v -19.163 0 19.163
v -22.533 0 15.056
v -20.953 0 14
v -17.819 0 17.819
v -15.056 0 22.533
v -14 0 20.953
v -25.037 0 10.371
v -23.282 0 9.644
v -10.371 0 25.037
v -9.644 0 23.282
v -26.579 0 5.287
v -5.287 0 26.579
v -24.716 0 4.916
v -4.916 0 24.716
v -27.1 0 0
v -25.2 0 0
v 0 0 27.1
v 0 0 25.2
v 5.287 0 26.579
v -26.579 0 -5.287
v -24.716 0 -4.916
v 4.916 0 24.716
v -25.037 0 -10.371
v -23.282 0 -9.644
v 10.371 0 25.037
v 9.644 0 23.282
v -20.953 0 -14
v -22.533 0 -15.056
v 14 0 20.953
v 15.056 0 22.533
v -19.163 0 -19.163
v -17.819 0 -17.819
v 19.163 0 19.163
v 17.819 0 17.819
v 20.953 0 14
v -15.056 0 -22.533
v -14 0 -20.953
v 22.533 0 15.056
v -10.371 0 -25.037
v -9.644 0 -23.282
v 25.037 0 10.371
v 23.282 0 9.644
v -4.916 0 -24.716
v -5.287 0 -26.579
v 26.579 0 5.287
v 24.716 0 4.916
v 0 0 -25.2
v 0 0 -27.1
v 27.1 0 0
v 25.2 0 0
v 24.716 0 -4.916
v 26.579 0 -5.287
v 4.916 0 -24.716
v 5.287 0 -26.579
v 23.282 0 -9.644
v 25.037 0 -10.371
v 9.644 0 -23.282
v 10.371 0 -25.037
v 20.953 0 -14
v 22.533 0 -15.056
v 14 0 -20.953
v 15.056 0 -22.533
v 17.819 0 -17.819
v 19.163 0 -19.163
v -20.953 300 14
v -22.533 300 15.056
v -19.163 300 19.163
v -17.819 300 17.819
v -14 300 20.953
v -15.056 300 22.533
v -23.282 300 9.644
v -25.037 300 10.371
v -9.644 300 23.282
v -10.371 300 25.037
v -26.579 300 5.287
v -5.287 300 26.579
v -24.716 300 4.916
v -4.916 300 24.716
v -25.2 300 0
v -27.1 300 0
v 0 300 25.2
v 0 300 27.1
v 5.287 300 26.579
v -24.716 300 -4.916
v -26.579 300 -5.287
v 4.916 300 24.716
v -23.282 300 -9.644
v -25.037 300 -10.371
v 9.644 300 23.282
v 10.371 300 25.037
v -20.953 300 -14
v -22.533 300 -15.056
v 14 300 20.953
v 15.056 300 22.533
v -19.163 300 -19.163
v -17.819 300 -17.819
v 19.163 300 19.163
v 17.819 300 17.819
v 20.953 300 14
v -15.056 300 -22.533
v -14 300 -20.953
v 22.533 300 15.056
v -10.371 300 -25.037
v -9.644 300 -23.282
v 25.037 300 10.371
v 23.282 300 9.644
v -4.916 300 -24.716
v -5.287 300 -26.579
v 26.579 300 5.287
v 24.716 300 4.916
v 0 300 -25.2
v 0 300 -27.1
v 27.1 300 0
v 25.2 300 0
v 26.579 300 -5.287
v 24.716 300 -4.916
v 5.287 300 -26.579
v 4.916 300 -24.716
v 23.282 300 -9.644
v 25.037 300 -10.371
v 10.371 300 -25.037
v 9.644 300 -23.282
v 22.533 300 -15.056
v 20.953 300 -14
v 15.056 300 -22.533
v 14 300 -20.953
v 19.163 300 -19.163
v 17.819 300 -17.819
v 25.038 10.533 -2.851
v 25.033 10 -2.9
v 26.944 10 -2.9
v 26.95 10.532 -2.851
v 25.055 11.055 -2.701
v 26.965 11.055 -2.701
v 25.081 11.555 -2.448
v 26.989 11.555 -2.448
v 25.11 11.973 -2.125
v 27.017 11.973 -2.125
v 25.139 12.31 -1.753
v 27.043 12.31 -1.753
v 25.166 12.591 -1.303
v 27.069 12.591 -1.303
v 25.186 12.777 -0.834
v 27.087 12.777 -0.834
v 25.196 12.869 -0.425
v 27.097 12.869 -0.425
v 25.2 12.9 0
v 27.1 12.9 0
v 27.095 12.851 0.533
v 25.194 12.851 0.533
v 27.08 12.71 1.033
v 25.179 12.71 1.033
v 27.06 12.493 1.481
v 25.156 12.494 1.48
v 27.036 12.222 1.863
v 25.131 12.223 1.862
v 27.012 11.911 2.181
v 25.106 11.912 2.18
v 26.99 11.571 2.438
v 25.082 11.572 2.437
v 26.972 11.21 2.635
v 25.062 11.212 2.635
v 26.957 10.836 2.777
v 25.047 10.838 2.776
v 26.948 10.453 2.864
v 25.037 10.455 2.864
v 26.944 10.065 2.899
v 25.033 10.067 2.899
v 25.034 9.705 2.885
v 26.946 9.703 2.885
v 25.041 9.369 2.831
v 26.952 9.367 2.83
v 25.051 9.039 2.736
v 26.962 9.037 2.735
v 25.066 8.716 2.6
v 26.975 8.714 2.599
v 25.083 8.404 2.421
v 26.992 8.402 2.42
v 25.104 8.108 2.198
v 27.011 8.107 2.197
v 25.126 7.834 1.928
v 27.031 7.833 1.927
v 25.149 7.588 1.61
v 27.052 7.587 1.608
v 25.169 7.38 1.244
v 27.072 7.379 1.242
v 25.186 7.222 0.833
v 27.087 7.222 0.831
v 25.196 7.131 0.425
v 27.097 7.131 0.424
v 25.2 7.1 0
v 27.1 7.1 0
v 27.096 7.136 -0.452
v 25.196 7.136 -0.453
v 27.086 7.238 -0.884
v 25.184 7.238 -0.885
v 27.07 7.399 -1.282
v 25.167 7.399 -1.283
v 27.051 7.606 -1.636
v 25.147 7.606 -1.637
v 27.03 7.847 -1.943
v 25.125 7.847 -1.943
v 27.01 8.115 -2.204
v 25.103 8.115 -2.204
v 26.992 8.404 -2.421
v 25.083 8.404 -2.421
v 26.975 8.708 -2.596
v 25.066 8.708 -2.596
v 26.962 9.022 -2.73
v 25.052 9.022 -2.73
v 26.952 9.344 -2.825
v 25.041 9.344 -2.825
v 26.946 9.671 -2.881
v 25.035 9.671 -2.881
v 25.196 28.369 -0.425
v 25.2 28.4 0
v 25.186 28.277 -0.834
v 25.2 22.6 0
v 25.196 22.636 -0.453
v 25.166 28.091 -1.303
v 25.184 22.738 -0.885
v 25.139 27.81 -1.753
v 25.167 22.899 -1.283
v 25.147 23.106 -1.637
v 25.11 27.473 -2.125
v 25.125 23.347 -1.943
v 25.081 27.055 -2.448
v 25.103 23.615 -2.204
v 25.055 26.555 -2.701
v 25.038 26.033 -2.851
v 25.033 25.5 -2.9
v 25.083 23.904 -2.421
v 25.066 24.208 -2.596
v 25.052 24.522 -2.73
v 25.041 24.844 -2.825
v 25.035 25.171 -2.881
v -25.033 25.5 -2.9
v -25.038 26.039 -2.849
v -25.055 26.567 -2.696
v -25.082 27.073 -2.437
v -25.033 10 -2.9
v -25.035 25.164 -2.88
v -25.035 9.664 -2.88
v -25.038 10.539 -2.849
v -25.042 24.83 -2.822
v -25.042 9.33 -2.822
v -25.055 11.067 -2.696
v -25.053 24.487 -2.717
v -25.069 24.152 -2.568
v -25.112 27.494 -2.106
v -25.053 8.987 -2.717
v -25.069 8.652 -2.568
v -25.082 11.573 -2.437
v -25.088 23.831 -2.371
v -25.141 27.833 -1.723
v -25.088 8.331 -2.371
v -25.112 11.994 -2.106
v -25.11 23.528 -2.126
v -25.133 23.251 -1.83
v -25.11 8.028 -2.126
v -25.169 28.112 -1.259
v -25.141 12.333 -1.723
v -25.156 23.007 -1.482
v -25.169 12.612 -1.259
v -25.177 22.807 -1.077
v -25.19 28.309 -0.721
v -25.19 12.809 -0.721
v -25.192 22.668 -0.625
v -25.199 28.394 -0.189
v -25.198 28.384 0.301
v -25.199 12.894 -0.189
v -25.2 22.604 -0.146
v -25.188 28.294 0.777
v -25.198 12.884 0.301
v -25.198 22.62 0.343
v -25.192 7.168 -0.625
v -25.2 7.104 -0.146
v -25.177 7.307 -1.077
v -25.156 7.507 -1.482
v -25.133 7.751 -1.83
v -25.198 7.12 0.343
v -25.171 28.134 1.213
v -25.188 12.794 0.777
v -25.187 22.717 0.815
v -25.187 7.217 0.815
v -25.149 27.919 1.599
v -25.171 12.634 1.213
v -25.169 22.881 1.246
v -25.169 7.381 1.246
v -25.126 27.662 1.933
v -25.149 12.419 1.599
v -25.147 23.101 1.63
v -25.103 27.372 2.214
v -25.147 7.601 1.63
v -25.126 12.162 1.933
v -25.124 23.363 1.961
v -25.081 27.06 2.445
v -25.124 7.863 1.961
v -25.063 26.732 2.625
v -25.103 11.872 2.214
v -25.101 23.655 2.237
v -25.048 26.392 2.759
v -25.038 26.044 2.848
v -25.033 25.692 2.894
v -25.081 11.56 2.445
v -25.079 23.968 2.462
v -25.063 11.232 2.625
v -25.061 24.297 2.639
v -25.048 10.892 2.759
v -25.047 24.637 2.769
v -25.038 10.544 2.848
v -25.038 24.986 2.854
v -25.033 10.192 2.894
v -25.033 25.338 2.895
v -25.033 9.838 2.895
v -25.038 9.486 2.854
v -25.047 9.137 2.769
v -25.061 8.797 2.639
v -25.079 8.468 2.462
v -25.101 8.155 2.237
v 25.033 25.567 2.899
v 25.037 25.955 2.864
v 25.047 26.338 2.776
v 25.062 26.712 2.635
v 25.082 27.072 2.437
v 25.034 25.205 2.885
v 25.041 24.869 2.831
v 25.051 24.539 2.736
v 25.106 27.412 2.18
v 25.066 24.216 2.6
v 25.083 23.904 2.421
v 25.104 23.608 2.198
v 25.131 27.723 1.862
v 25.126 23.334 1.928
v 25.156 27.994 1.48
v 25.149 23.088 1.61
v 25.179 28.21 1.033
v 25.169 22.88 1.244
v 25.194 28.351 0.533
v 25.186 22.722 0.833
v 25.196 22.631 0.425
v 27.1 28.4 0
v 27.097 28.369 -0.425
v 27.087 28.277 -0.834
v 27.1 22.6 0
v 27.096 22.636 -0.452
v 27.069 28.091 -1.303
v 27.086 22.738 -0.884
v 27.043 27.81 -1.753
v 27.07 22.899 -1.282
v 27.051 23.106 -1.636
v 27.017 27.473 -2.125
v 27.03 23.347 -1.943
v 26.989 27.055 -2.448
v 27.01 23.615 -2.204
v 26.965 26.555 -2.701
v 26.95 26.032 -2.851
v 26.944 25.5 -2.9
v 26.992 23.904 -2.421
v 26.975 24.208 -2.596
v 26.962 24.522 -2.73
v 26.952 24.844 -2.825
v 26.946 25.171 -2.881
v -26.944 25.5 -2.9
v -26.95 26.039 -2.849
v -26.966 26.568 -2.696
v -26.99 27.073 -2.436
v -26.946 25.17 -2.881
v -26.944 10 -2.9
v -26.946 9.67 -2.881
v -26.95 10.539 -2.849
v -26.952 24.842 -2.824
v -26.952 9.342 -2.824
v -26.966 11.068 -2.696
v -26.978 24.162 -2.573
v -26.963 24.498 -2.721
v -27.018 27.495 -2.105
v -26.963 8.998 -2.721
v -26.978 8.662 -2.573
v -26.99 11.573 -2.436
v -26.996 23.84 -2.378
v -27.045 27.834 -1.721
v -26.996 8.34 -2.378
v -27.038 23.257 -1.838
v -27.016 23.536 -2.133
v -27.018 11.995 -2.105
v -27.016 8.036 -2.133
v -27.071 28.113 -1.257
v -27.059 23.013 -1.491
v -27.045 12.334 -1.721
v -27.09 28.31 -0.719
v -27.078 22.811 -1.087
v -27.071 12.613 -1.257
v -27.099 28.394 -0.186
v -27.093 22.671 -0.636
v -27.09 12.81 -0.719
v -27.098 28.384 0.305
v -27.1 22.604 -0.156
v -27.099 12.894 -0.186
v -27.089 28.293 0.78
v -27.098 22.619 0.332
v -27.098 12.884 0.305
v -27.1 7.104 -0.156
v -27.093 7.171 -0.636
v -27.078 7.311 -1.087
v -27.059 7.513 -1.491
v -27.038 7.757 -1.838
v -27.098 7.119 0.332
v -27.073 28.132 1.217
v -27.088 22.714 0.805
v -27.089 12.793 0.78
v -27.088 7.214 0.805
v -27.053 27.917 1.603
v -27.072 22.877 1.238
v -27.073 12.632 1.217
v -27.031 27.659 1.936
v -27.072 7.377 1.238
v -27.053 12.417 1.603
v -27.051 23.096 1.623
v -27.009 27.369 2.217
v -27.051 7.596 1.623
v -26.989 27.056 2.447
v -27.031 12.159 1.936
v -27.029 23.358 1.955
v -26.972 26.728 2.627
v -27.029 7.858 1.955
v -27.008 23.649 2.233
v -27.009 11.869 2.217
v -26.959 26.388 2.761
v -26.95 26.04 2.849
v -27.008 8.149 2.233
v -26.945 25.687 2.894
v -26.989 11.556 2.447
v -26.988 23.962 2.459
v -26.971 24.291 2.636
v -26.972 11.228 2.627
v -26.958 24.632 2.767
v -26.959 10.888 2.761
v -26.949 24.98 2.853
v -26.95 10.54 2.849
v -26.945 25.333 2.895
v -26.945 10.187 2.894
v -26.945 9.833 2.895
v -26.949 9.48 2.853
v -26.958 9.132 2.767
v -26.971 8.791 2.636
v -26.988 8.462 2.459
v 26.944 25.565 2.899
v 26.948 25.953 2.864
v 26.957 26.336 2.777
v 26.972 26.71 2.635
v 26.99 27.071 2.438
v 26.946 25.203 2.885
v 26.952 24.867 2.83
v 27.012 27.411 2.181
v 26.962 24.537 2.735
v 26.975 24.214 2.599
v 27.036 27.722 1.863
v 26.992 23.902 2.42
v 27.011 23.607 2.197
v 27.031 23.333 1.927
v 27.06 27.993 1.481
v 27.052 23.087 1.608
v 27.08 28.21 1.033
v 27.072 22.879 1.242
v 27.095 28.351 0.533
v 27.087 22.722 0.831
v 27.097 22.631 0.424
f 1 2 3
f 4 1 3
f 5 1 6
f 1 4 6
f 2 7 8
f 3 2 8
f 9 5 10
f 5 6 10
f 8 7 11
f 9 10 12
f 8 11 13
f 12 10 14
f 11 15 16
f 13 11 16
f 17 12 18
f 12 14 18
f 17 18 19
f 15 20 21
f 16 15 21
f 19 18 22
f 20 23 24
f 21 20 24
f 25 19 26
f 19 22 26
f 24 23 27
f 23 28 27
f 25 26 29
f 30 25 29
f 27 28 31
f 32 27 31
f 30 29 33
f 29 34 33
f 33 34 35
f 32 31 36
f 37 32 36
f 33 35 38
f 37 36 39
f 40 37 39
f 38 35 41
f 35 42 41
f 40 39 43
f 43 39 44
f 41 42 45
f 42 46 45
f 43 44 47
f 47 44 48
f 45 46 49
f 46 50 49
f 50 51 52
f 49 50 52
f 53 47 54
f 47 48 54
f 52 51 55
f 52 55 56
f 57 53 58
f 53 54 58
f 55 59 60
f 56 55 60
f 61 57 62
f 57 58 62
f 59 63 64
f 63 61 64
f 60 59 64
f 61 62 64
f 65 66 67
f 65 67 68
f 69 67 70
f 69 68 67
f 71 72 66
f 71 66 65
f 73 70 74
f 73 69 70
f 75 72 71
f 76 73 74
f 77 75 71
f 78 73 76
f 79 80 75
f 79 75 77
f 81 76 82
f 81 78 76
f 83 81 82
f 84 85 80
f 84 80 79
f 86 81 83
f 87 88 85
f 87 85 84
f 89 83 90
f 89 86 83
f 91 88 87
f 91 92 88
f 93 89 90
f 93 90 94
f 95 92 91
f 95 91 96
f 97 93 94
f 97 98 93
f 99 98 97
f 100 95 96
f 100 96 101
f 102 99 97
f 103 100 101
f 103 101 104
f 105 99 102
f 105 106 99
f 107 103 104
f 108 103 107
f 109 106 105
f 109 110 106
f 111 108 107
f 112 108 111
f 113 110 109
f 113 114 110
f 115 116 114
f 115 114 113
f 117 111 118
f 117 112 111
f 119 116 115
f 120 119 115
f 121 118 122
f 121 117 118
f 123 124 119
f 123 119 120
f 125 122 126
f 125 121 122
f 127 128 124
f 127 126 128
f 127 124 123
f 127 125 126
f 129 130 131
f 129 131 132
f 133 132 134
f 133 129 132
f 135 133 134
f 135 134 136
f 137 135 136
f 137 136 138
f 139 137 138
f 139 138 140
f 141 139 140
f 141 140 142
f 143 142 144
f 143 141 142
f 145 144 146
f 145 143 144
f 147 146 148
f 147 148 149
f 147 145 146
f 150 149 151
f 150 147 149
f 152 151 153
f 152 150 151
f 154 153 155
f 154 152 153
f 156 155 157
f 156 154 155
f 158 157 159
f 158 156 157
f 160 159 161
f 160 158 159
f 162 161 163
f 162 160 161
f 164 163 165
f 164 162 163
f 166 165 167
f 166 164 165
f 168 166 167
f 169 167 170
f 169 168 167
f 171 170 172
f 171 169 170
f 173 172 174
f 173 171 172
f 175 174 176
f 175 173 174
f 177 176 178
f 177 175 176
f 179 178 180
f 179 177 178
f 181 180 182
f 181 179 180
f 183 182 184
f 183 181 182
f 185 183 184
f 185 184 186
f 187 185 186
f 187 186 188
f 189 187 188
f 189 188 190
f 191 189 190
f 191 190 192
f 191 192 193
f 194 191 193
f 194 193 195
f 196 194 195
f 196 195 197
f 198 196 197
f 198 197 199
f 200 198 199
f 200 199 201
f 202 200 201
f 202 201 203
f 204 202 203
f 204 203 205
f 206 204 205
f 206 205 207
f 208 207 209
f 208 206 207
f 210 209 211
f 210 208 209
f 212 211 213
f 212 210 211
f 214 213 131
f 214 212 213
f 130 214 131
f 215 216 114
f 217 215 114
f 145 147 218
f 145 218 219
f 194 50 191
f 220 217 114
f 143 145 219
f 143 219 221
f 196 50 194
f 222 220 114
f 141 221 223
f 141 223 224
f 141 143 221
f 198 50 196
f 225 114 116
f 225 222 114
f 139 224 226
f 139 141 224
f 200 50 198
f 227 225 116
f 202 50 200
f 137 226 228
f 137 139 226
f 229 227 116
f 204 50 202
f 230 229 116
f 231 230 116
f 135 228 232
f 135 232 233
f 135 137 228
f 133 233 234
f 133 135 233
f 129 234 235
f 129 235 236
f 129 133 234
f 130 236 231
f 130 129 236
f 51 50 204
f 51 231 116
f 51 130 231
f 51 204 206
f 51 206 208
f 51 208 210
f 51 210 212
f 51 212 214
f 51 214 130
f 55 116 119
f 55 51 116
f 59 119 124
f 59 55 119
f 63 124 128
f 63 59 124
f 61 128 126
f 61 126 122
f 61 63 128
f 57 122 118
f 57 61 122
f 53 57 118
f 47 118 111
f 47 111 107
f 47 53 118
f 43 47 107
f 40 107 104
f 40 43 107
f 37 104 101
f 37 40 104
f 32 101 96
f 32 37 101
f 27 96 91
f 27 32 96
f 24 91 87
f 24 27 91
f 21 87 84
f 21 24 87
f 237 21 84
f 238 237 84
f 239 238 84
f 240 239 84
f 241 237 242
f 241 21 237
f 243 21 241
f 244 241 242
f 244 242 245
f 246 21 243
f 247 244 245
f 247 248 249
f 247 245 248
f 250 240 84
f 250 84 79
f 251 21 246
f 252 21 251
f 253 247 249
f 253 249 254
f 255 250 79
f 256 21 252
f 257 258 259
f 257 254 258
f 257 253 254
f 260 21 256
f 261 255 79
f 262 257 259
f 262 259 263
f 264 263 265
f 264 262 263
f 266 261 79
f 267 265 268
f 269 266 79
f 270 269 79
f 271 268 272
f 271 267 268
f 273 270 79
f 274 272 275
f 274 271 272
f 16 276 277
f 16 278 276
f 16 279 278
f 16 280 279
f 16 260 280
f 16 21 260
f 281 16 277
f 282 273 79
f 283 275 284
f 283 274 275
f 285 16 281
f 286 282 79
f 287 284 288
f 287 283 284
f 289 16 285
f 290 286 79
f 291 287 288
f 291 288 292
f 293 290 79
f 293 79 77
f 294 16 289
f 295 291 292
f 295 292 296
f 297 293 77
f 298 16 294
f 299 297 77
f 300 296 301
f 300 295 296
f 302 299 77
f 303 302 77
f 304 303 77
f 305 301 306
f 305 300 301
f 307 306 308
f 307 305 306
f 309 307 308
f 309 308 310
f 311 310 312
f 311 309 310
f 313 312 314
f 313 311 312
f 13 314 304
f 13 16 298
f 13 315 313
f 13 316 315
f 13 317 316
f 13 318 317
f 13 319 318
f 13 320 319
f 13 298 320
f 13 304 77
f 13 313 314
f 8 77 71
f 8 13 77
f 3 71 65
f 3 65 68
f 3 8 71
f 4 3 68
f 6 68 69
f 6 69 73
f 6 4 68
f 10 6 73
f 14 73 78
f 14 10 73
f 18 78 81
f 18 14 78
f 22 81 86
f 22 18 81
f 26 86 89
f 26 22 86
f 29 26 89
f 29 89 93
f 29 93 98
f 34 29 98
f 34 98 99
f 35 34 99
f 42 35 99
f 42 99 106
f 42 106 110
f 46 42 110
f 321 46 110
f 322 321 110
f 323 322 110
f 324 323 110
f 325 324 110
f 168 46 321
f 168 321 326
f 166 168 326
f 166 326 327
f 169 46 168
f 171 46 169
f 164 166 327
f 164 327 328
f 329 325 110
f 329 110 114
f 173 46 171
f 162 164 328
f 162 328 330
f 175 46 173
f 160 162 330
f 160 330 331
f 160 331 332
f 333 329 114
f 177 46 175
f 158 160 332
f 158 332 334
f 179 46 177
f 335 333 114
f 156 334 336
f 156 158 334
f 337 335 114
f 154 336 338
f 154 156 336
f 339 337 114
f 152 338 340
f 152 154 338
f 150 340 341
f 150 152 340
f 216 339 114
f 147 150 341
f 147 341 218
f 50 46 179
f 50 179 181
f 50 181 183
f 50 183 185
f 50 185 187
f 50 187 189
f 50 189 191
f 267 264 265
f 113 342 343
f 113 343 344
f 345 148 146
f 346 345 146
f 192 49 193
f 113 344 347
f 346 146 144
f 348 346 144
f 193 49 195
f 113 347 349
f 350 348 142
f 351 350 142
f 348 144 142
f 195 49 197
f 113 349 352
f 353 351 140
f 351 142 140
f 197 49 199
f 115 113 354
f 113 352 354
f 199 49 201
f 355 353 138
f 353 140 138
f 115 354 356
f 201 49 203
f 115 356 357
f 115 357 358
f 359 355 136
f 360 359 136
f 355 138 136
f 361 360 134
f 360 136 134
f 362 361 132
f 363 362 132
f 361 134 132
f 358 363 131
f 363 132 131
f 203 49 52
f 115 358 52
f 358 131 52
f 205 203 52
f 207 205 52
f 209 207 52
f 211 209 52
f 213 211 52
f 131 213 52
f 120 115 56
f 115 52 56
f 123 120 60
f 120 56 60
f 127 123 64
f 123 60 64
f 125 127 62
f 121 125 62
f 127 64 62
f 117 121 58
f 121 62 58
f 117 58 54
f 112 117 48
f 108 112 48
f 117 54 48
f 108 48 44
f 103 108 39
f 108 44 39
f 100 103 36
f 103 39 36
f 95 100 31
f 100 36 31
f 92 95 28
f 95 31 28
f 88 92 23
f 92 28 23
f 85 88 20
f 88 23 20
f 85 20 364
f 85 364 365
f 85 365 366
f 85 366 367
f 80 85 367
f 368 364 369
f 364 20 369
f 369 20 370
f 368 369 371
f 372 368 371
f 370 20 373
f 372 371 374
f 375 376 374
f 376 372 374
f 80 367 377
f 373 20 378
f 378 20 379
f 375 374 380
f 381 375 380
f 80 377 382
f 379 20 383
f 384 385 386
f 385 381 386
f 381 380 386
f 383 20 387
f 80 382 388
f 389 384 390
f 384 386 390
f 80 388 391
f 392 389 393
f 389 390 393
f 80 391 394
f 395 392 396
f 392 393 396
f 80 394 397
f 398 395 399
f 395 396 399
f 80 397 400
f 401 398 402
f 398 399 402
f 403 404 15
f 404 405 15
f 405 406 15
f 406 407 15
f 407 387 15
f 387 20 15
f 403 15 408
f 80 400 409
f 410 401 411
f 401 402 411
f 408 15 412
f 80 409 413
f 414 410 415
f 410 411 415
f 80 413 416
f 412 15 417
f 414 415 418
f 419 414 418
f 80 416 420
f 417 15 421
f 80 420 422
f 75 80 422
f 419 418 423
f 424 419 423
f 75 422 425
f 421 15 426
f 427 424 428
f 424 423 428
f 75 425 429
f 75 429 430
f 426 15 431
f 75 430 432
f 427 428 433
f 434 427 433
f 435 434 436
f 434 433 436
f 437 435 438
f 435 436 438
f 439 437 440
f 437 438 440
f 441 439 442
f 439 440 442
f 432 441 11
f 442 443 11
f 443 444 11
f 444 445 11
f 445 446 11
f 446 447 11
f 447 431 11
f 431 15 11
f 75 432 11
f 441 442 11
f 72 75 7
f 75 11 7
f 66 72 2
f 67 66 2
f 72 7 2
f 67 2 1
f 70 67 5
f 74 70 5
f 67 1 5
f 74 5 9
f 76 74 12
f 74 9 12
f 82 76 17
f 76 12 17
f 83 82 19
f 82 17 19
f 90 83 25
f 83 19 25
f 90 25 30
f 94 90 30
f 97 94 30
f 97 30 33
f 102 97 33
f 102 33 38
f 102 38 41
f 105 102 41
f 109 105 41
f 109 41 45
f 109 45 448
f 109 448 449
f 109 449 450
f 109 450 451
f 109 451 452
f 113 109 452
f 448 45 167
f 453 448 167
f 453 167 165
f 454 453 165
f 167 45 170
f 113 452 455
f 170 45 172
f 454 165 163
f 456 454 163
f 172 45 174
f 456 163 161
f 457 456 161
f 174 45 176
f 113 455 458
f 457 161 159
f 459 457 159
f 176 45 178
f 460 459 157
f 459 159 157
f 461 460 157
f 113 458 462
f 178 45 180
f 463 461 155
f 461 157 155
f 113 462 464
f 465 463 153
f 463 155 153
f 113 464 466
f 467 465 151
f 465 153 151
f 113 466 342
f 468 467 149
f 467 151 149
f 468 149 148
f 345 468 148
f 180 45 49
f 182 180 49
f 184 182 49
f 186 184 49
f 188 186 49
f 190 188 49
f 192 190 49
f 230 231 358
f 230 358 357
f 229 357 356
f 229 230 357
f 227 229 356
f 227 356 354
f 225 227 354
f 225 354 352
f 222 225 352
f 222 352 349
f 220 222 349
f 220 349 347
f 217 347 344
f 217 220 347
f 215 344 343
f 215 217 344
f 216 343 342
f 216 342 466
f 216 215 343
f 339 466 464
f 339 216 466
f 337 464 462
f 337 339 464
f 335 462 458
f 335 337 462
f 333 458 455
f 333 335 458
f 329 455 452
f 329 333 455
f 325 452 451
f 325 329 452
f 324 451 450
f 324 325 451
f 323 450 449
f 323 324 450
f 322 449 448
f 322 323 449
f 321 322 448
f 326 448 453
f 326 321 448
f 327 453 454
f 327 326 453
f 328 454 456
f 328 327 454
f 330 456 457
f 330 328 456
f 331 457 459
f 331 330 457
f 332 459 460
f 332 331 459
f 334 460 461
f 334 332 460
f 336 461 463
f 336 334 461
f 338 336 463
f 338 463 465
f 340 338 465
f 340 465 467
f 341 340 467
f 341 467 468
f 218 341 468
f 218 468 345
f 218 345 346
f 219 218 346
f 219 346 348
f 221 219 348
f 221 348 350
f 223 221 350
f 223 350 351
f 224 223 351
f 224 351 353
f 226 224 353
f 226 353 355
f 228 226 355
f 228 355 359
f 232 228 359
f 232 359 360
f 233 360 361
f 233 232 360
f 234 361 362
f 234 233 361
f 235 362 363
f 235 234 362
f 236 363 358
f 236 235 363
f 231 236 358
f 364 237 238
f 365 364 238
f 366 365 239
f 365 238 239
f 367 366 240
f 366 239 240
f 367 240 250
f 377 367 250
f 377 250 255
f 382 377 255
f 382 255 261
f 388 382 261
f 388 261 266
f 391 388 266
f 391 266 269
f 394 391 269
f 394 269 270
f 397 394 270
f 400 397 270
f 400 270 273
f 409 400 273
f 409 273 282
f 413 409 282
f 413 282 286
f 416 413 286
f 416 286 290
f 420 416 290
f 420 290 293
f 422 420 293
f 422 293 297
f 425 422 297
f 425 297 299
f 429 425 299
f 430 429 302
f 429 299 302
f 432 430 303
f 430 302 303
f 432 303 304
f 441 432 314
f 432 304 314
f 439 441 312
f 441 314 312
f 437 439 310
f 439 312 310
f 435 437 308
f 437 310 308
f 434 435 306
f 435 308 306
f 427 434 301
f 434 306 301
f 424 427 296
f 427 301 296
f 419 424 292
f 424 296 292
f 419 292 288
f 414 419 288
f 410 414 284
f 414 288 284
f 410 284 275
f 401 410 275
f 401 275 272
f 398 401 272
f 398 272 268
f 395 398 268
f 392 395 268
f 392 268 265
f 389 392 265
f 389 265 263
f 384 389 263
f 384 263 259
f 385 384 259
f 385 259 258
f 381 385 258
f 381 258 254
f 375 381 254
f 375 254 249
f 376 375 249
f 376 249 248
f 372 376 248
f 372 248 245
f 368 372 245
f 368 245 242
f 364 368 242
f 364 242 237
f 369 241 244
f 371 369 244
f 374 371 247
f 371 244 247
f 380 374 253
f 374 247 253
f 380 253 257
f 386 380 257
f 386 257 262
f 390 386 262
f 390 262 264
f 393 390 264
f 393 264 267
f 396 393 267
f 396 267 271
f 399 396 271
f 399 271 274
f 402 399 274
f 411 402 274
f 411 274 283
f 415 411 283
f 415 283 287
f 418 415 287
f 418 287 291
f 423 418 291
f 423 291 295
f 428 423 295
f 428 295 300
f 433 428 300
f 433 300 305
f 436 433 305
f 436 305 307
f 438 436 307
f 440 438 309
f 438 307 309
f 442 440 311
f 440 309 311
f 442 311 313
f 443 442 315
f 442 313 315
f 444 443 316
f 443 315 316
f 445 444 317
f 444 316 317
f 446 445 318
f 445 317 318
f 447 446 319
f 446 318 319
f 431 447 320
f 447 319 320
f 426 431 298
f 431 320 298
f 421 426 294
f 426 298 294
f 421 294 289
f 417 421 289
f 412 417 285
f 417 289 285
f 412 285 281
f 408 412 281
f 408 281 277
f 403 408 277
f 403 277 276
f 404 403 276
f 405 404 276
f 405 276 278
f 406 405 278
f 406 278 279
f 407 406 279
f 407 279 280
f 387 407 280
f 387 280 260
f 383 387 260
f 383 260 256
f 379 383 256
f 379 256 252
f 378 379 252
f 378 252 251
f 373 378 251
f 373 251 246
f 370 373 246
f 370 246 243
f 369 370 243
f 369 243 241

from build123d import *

# Parameters (mm, degrees)
SKETCH1_R               = 27.1
SKETCH1_R_2             = 25.2
BOSS_EXTRUDE1_DEPTH     = 300
SKETCH2_R               = 2.9
CUT_EXTRUDE1_DEPTH      = 28.1
CUT_EXTRUDE1_DEPTH_BACK = 28.1


with BuildPart() as part:
    # Sketch1 → Boss-Extrude1 (new body)
    with BuildSketch(Plane(origin=(0, 0, 0), x_dir=(1, 0, 0), z_dir=(0, 1, 0))):
        Circle(SKETCH1_R)
        Circle(SKETCH1_R_2, mode=Mode.SUBTRACT)
    extrude(amount=BOSS_EXTRUDE1_DEPTH)

    # Sketch2 → Cut-Extrude1 (cut, two sides)
    with BuildSketch(Plane(origin=(0, 0, 0), x_dir=(0, 0, -1), z_dir=(1, 0, 0))) as cut_extrude1_sk:
        with Locations((0, 10)):
            Circle(SKETCH2_R)
        with Locations((0, 25.5)):
            Circle(SKETCH2_R)
    extrude(amount=CUT_EXTRUDE1_DEPTH, mode=Mode.SUBTRACT)
    extrude(cut_extrude1_sk.sketch, amount=-CUT_EXTRUDE1_DEPTH_BACK, mode=Mode.SUBTRACT)


solid = part.part
